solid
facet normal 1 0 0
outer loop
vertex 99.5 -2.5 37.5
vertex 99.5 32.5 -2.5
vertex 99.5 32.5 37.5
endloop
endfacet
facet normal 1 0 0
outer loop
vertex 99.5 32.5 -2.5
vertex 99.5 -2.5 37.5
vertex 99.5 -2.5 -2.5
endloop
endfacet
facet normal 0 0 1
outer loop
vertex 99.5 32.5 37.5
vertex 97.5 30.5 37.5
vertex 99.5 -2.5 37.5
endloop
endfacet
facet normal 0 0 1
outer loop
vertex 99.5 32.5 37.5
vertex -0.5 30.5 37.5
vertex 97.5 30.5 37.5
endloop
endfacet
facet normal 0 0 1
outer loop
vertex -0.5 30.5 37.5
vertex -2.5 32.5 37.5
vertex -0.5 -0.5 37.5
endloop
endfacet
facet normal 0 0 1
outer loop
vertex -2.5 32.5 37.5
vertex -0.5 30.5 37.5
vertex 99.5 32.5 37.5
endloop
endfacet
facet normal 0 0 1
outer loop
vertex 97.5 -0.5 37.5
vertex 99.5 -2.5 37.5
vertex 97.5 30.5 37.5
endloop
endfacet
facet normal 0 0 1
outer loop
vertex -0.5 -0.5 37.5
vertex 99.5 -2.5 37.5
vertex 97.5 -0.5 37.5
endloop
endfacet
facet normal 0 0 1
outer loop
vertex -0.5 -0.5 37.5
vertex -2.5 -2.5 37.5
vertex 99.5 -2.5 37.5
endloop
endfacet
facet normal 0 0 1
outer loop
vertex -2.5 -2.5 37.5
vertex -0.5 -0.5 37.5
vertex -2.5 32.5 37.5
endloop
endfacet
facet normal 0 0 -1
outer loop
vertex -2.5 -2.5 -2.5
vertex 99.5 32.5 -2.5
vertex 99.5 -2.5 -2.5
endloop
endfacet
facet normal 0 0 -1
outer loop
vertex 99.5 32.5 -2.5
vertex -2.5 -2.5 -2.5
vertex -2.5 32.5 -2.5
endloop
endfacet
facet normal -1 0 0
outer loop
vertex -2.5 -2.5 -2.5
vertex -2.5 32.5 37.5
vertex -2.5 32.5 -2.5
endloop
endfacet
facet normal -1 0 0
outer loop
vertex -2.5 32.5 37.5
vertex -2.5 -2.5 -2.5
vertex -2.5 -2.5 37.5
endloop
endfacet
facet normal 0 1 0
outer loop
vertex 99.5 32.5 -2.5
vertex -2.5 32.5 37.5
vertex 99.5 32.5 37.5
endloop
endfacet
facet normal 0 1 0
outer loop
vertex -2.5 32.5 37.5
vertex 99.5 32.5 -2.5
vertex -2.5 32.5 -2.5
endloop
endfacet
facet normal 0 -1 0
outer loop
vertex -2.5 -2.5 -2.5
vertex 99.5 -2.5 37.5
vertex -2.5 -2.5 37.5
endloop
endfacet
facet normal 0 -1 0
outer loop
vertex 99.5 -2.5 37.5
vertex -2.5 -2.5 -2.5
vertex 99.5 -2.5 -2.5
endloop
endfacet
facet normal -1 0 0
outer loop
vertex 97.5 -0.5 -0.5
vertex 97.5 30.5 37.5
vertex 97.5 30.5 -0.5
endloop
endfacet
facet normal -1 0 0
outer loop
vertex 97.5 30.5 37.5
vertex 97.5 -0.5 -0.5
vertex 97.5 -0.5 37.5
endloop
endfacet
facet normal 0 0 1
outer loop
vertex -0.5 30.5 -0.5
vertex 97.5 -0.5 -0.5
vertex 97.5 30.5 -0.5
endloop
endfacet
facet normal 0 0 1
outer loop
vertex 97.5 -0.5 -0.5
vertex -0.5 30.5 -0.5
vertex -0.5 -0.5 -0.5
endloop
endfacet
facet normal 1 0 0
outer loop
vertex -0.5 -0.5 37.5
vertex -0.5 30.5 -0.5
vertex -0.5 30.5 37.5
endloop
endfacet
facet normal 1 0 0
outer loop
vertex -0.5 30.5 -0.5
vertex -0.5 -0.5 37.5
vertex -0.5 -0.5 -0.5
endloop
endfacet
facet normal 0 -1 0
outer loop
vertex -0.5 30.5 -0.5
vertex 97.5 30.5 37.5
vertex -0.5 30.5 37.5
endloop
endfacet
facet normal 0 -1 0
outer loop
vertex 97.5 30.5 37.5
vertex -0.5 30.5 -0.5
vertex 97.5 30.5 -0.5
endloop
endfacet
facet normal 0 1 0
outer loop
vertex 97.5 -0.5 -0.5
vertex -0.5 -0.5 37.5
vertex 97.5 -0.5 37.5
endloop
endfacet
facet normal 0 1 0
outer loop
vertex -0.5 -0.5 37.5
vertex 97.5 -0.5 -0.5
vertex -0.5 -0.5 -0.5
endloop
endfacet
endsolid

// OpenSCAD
PSW = 97; // power supply width
PSD = 30; // power supply depth
PSH = 129; // power supply height
WT = 2; // wall thickness
DWT = 2*WT; // double wall thickness
S = .5; // spacing between part & power supply
DS = 2*S; // double spacing
PHM = 40; // maximum protector height
//PH

// power supply:
//color("lightgray") cube([PSW,PSD,PSH]);

// actual part:
color("red") {
    translate([-(WT+S),-(WT+S),-(WT+S)]) difference() {
        // full cube:
        cube([PSW+DWT+DS,PSD+DWT+DS,PHM]);
        // remove everything but the walls:
        translate([WT,WT,WT]) cube([PSW+DS,PSD+DS,PHM]);
    }
}
